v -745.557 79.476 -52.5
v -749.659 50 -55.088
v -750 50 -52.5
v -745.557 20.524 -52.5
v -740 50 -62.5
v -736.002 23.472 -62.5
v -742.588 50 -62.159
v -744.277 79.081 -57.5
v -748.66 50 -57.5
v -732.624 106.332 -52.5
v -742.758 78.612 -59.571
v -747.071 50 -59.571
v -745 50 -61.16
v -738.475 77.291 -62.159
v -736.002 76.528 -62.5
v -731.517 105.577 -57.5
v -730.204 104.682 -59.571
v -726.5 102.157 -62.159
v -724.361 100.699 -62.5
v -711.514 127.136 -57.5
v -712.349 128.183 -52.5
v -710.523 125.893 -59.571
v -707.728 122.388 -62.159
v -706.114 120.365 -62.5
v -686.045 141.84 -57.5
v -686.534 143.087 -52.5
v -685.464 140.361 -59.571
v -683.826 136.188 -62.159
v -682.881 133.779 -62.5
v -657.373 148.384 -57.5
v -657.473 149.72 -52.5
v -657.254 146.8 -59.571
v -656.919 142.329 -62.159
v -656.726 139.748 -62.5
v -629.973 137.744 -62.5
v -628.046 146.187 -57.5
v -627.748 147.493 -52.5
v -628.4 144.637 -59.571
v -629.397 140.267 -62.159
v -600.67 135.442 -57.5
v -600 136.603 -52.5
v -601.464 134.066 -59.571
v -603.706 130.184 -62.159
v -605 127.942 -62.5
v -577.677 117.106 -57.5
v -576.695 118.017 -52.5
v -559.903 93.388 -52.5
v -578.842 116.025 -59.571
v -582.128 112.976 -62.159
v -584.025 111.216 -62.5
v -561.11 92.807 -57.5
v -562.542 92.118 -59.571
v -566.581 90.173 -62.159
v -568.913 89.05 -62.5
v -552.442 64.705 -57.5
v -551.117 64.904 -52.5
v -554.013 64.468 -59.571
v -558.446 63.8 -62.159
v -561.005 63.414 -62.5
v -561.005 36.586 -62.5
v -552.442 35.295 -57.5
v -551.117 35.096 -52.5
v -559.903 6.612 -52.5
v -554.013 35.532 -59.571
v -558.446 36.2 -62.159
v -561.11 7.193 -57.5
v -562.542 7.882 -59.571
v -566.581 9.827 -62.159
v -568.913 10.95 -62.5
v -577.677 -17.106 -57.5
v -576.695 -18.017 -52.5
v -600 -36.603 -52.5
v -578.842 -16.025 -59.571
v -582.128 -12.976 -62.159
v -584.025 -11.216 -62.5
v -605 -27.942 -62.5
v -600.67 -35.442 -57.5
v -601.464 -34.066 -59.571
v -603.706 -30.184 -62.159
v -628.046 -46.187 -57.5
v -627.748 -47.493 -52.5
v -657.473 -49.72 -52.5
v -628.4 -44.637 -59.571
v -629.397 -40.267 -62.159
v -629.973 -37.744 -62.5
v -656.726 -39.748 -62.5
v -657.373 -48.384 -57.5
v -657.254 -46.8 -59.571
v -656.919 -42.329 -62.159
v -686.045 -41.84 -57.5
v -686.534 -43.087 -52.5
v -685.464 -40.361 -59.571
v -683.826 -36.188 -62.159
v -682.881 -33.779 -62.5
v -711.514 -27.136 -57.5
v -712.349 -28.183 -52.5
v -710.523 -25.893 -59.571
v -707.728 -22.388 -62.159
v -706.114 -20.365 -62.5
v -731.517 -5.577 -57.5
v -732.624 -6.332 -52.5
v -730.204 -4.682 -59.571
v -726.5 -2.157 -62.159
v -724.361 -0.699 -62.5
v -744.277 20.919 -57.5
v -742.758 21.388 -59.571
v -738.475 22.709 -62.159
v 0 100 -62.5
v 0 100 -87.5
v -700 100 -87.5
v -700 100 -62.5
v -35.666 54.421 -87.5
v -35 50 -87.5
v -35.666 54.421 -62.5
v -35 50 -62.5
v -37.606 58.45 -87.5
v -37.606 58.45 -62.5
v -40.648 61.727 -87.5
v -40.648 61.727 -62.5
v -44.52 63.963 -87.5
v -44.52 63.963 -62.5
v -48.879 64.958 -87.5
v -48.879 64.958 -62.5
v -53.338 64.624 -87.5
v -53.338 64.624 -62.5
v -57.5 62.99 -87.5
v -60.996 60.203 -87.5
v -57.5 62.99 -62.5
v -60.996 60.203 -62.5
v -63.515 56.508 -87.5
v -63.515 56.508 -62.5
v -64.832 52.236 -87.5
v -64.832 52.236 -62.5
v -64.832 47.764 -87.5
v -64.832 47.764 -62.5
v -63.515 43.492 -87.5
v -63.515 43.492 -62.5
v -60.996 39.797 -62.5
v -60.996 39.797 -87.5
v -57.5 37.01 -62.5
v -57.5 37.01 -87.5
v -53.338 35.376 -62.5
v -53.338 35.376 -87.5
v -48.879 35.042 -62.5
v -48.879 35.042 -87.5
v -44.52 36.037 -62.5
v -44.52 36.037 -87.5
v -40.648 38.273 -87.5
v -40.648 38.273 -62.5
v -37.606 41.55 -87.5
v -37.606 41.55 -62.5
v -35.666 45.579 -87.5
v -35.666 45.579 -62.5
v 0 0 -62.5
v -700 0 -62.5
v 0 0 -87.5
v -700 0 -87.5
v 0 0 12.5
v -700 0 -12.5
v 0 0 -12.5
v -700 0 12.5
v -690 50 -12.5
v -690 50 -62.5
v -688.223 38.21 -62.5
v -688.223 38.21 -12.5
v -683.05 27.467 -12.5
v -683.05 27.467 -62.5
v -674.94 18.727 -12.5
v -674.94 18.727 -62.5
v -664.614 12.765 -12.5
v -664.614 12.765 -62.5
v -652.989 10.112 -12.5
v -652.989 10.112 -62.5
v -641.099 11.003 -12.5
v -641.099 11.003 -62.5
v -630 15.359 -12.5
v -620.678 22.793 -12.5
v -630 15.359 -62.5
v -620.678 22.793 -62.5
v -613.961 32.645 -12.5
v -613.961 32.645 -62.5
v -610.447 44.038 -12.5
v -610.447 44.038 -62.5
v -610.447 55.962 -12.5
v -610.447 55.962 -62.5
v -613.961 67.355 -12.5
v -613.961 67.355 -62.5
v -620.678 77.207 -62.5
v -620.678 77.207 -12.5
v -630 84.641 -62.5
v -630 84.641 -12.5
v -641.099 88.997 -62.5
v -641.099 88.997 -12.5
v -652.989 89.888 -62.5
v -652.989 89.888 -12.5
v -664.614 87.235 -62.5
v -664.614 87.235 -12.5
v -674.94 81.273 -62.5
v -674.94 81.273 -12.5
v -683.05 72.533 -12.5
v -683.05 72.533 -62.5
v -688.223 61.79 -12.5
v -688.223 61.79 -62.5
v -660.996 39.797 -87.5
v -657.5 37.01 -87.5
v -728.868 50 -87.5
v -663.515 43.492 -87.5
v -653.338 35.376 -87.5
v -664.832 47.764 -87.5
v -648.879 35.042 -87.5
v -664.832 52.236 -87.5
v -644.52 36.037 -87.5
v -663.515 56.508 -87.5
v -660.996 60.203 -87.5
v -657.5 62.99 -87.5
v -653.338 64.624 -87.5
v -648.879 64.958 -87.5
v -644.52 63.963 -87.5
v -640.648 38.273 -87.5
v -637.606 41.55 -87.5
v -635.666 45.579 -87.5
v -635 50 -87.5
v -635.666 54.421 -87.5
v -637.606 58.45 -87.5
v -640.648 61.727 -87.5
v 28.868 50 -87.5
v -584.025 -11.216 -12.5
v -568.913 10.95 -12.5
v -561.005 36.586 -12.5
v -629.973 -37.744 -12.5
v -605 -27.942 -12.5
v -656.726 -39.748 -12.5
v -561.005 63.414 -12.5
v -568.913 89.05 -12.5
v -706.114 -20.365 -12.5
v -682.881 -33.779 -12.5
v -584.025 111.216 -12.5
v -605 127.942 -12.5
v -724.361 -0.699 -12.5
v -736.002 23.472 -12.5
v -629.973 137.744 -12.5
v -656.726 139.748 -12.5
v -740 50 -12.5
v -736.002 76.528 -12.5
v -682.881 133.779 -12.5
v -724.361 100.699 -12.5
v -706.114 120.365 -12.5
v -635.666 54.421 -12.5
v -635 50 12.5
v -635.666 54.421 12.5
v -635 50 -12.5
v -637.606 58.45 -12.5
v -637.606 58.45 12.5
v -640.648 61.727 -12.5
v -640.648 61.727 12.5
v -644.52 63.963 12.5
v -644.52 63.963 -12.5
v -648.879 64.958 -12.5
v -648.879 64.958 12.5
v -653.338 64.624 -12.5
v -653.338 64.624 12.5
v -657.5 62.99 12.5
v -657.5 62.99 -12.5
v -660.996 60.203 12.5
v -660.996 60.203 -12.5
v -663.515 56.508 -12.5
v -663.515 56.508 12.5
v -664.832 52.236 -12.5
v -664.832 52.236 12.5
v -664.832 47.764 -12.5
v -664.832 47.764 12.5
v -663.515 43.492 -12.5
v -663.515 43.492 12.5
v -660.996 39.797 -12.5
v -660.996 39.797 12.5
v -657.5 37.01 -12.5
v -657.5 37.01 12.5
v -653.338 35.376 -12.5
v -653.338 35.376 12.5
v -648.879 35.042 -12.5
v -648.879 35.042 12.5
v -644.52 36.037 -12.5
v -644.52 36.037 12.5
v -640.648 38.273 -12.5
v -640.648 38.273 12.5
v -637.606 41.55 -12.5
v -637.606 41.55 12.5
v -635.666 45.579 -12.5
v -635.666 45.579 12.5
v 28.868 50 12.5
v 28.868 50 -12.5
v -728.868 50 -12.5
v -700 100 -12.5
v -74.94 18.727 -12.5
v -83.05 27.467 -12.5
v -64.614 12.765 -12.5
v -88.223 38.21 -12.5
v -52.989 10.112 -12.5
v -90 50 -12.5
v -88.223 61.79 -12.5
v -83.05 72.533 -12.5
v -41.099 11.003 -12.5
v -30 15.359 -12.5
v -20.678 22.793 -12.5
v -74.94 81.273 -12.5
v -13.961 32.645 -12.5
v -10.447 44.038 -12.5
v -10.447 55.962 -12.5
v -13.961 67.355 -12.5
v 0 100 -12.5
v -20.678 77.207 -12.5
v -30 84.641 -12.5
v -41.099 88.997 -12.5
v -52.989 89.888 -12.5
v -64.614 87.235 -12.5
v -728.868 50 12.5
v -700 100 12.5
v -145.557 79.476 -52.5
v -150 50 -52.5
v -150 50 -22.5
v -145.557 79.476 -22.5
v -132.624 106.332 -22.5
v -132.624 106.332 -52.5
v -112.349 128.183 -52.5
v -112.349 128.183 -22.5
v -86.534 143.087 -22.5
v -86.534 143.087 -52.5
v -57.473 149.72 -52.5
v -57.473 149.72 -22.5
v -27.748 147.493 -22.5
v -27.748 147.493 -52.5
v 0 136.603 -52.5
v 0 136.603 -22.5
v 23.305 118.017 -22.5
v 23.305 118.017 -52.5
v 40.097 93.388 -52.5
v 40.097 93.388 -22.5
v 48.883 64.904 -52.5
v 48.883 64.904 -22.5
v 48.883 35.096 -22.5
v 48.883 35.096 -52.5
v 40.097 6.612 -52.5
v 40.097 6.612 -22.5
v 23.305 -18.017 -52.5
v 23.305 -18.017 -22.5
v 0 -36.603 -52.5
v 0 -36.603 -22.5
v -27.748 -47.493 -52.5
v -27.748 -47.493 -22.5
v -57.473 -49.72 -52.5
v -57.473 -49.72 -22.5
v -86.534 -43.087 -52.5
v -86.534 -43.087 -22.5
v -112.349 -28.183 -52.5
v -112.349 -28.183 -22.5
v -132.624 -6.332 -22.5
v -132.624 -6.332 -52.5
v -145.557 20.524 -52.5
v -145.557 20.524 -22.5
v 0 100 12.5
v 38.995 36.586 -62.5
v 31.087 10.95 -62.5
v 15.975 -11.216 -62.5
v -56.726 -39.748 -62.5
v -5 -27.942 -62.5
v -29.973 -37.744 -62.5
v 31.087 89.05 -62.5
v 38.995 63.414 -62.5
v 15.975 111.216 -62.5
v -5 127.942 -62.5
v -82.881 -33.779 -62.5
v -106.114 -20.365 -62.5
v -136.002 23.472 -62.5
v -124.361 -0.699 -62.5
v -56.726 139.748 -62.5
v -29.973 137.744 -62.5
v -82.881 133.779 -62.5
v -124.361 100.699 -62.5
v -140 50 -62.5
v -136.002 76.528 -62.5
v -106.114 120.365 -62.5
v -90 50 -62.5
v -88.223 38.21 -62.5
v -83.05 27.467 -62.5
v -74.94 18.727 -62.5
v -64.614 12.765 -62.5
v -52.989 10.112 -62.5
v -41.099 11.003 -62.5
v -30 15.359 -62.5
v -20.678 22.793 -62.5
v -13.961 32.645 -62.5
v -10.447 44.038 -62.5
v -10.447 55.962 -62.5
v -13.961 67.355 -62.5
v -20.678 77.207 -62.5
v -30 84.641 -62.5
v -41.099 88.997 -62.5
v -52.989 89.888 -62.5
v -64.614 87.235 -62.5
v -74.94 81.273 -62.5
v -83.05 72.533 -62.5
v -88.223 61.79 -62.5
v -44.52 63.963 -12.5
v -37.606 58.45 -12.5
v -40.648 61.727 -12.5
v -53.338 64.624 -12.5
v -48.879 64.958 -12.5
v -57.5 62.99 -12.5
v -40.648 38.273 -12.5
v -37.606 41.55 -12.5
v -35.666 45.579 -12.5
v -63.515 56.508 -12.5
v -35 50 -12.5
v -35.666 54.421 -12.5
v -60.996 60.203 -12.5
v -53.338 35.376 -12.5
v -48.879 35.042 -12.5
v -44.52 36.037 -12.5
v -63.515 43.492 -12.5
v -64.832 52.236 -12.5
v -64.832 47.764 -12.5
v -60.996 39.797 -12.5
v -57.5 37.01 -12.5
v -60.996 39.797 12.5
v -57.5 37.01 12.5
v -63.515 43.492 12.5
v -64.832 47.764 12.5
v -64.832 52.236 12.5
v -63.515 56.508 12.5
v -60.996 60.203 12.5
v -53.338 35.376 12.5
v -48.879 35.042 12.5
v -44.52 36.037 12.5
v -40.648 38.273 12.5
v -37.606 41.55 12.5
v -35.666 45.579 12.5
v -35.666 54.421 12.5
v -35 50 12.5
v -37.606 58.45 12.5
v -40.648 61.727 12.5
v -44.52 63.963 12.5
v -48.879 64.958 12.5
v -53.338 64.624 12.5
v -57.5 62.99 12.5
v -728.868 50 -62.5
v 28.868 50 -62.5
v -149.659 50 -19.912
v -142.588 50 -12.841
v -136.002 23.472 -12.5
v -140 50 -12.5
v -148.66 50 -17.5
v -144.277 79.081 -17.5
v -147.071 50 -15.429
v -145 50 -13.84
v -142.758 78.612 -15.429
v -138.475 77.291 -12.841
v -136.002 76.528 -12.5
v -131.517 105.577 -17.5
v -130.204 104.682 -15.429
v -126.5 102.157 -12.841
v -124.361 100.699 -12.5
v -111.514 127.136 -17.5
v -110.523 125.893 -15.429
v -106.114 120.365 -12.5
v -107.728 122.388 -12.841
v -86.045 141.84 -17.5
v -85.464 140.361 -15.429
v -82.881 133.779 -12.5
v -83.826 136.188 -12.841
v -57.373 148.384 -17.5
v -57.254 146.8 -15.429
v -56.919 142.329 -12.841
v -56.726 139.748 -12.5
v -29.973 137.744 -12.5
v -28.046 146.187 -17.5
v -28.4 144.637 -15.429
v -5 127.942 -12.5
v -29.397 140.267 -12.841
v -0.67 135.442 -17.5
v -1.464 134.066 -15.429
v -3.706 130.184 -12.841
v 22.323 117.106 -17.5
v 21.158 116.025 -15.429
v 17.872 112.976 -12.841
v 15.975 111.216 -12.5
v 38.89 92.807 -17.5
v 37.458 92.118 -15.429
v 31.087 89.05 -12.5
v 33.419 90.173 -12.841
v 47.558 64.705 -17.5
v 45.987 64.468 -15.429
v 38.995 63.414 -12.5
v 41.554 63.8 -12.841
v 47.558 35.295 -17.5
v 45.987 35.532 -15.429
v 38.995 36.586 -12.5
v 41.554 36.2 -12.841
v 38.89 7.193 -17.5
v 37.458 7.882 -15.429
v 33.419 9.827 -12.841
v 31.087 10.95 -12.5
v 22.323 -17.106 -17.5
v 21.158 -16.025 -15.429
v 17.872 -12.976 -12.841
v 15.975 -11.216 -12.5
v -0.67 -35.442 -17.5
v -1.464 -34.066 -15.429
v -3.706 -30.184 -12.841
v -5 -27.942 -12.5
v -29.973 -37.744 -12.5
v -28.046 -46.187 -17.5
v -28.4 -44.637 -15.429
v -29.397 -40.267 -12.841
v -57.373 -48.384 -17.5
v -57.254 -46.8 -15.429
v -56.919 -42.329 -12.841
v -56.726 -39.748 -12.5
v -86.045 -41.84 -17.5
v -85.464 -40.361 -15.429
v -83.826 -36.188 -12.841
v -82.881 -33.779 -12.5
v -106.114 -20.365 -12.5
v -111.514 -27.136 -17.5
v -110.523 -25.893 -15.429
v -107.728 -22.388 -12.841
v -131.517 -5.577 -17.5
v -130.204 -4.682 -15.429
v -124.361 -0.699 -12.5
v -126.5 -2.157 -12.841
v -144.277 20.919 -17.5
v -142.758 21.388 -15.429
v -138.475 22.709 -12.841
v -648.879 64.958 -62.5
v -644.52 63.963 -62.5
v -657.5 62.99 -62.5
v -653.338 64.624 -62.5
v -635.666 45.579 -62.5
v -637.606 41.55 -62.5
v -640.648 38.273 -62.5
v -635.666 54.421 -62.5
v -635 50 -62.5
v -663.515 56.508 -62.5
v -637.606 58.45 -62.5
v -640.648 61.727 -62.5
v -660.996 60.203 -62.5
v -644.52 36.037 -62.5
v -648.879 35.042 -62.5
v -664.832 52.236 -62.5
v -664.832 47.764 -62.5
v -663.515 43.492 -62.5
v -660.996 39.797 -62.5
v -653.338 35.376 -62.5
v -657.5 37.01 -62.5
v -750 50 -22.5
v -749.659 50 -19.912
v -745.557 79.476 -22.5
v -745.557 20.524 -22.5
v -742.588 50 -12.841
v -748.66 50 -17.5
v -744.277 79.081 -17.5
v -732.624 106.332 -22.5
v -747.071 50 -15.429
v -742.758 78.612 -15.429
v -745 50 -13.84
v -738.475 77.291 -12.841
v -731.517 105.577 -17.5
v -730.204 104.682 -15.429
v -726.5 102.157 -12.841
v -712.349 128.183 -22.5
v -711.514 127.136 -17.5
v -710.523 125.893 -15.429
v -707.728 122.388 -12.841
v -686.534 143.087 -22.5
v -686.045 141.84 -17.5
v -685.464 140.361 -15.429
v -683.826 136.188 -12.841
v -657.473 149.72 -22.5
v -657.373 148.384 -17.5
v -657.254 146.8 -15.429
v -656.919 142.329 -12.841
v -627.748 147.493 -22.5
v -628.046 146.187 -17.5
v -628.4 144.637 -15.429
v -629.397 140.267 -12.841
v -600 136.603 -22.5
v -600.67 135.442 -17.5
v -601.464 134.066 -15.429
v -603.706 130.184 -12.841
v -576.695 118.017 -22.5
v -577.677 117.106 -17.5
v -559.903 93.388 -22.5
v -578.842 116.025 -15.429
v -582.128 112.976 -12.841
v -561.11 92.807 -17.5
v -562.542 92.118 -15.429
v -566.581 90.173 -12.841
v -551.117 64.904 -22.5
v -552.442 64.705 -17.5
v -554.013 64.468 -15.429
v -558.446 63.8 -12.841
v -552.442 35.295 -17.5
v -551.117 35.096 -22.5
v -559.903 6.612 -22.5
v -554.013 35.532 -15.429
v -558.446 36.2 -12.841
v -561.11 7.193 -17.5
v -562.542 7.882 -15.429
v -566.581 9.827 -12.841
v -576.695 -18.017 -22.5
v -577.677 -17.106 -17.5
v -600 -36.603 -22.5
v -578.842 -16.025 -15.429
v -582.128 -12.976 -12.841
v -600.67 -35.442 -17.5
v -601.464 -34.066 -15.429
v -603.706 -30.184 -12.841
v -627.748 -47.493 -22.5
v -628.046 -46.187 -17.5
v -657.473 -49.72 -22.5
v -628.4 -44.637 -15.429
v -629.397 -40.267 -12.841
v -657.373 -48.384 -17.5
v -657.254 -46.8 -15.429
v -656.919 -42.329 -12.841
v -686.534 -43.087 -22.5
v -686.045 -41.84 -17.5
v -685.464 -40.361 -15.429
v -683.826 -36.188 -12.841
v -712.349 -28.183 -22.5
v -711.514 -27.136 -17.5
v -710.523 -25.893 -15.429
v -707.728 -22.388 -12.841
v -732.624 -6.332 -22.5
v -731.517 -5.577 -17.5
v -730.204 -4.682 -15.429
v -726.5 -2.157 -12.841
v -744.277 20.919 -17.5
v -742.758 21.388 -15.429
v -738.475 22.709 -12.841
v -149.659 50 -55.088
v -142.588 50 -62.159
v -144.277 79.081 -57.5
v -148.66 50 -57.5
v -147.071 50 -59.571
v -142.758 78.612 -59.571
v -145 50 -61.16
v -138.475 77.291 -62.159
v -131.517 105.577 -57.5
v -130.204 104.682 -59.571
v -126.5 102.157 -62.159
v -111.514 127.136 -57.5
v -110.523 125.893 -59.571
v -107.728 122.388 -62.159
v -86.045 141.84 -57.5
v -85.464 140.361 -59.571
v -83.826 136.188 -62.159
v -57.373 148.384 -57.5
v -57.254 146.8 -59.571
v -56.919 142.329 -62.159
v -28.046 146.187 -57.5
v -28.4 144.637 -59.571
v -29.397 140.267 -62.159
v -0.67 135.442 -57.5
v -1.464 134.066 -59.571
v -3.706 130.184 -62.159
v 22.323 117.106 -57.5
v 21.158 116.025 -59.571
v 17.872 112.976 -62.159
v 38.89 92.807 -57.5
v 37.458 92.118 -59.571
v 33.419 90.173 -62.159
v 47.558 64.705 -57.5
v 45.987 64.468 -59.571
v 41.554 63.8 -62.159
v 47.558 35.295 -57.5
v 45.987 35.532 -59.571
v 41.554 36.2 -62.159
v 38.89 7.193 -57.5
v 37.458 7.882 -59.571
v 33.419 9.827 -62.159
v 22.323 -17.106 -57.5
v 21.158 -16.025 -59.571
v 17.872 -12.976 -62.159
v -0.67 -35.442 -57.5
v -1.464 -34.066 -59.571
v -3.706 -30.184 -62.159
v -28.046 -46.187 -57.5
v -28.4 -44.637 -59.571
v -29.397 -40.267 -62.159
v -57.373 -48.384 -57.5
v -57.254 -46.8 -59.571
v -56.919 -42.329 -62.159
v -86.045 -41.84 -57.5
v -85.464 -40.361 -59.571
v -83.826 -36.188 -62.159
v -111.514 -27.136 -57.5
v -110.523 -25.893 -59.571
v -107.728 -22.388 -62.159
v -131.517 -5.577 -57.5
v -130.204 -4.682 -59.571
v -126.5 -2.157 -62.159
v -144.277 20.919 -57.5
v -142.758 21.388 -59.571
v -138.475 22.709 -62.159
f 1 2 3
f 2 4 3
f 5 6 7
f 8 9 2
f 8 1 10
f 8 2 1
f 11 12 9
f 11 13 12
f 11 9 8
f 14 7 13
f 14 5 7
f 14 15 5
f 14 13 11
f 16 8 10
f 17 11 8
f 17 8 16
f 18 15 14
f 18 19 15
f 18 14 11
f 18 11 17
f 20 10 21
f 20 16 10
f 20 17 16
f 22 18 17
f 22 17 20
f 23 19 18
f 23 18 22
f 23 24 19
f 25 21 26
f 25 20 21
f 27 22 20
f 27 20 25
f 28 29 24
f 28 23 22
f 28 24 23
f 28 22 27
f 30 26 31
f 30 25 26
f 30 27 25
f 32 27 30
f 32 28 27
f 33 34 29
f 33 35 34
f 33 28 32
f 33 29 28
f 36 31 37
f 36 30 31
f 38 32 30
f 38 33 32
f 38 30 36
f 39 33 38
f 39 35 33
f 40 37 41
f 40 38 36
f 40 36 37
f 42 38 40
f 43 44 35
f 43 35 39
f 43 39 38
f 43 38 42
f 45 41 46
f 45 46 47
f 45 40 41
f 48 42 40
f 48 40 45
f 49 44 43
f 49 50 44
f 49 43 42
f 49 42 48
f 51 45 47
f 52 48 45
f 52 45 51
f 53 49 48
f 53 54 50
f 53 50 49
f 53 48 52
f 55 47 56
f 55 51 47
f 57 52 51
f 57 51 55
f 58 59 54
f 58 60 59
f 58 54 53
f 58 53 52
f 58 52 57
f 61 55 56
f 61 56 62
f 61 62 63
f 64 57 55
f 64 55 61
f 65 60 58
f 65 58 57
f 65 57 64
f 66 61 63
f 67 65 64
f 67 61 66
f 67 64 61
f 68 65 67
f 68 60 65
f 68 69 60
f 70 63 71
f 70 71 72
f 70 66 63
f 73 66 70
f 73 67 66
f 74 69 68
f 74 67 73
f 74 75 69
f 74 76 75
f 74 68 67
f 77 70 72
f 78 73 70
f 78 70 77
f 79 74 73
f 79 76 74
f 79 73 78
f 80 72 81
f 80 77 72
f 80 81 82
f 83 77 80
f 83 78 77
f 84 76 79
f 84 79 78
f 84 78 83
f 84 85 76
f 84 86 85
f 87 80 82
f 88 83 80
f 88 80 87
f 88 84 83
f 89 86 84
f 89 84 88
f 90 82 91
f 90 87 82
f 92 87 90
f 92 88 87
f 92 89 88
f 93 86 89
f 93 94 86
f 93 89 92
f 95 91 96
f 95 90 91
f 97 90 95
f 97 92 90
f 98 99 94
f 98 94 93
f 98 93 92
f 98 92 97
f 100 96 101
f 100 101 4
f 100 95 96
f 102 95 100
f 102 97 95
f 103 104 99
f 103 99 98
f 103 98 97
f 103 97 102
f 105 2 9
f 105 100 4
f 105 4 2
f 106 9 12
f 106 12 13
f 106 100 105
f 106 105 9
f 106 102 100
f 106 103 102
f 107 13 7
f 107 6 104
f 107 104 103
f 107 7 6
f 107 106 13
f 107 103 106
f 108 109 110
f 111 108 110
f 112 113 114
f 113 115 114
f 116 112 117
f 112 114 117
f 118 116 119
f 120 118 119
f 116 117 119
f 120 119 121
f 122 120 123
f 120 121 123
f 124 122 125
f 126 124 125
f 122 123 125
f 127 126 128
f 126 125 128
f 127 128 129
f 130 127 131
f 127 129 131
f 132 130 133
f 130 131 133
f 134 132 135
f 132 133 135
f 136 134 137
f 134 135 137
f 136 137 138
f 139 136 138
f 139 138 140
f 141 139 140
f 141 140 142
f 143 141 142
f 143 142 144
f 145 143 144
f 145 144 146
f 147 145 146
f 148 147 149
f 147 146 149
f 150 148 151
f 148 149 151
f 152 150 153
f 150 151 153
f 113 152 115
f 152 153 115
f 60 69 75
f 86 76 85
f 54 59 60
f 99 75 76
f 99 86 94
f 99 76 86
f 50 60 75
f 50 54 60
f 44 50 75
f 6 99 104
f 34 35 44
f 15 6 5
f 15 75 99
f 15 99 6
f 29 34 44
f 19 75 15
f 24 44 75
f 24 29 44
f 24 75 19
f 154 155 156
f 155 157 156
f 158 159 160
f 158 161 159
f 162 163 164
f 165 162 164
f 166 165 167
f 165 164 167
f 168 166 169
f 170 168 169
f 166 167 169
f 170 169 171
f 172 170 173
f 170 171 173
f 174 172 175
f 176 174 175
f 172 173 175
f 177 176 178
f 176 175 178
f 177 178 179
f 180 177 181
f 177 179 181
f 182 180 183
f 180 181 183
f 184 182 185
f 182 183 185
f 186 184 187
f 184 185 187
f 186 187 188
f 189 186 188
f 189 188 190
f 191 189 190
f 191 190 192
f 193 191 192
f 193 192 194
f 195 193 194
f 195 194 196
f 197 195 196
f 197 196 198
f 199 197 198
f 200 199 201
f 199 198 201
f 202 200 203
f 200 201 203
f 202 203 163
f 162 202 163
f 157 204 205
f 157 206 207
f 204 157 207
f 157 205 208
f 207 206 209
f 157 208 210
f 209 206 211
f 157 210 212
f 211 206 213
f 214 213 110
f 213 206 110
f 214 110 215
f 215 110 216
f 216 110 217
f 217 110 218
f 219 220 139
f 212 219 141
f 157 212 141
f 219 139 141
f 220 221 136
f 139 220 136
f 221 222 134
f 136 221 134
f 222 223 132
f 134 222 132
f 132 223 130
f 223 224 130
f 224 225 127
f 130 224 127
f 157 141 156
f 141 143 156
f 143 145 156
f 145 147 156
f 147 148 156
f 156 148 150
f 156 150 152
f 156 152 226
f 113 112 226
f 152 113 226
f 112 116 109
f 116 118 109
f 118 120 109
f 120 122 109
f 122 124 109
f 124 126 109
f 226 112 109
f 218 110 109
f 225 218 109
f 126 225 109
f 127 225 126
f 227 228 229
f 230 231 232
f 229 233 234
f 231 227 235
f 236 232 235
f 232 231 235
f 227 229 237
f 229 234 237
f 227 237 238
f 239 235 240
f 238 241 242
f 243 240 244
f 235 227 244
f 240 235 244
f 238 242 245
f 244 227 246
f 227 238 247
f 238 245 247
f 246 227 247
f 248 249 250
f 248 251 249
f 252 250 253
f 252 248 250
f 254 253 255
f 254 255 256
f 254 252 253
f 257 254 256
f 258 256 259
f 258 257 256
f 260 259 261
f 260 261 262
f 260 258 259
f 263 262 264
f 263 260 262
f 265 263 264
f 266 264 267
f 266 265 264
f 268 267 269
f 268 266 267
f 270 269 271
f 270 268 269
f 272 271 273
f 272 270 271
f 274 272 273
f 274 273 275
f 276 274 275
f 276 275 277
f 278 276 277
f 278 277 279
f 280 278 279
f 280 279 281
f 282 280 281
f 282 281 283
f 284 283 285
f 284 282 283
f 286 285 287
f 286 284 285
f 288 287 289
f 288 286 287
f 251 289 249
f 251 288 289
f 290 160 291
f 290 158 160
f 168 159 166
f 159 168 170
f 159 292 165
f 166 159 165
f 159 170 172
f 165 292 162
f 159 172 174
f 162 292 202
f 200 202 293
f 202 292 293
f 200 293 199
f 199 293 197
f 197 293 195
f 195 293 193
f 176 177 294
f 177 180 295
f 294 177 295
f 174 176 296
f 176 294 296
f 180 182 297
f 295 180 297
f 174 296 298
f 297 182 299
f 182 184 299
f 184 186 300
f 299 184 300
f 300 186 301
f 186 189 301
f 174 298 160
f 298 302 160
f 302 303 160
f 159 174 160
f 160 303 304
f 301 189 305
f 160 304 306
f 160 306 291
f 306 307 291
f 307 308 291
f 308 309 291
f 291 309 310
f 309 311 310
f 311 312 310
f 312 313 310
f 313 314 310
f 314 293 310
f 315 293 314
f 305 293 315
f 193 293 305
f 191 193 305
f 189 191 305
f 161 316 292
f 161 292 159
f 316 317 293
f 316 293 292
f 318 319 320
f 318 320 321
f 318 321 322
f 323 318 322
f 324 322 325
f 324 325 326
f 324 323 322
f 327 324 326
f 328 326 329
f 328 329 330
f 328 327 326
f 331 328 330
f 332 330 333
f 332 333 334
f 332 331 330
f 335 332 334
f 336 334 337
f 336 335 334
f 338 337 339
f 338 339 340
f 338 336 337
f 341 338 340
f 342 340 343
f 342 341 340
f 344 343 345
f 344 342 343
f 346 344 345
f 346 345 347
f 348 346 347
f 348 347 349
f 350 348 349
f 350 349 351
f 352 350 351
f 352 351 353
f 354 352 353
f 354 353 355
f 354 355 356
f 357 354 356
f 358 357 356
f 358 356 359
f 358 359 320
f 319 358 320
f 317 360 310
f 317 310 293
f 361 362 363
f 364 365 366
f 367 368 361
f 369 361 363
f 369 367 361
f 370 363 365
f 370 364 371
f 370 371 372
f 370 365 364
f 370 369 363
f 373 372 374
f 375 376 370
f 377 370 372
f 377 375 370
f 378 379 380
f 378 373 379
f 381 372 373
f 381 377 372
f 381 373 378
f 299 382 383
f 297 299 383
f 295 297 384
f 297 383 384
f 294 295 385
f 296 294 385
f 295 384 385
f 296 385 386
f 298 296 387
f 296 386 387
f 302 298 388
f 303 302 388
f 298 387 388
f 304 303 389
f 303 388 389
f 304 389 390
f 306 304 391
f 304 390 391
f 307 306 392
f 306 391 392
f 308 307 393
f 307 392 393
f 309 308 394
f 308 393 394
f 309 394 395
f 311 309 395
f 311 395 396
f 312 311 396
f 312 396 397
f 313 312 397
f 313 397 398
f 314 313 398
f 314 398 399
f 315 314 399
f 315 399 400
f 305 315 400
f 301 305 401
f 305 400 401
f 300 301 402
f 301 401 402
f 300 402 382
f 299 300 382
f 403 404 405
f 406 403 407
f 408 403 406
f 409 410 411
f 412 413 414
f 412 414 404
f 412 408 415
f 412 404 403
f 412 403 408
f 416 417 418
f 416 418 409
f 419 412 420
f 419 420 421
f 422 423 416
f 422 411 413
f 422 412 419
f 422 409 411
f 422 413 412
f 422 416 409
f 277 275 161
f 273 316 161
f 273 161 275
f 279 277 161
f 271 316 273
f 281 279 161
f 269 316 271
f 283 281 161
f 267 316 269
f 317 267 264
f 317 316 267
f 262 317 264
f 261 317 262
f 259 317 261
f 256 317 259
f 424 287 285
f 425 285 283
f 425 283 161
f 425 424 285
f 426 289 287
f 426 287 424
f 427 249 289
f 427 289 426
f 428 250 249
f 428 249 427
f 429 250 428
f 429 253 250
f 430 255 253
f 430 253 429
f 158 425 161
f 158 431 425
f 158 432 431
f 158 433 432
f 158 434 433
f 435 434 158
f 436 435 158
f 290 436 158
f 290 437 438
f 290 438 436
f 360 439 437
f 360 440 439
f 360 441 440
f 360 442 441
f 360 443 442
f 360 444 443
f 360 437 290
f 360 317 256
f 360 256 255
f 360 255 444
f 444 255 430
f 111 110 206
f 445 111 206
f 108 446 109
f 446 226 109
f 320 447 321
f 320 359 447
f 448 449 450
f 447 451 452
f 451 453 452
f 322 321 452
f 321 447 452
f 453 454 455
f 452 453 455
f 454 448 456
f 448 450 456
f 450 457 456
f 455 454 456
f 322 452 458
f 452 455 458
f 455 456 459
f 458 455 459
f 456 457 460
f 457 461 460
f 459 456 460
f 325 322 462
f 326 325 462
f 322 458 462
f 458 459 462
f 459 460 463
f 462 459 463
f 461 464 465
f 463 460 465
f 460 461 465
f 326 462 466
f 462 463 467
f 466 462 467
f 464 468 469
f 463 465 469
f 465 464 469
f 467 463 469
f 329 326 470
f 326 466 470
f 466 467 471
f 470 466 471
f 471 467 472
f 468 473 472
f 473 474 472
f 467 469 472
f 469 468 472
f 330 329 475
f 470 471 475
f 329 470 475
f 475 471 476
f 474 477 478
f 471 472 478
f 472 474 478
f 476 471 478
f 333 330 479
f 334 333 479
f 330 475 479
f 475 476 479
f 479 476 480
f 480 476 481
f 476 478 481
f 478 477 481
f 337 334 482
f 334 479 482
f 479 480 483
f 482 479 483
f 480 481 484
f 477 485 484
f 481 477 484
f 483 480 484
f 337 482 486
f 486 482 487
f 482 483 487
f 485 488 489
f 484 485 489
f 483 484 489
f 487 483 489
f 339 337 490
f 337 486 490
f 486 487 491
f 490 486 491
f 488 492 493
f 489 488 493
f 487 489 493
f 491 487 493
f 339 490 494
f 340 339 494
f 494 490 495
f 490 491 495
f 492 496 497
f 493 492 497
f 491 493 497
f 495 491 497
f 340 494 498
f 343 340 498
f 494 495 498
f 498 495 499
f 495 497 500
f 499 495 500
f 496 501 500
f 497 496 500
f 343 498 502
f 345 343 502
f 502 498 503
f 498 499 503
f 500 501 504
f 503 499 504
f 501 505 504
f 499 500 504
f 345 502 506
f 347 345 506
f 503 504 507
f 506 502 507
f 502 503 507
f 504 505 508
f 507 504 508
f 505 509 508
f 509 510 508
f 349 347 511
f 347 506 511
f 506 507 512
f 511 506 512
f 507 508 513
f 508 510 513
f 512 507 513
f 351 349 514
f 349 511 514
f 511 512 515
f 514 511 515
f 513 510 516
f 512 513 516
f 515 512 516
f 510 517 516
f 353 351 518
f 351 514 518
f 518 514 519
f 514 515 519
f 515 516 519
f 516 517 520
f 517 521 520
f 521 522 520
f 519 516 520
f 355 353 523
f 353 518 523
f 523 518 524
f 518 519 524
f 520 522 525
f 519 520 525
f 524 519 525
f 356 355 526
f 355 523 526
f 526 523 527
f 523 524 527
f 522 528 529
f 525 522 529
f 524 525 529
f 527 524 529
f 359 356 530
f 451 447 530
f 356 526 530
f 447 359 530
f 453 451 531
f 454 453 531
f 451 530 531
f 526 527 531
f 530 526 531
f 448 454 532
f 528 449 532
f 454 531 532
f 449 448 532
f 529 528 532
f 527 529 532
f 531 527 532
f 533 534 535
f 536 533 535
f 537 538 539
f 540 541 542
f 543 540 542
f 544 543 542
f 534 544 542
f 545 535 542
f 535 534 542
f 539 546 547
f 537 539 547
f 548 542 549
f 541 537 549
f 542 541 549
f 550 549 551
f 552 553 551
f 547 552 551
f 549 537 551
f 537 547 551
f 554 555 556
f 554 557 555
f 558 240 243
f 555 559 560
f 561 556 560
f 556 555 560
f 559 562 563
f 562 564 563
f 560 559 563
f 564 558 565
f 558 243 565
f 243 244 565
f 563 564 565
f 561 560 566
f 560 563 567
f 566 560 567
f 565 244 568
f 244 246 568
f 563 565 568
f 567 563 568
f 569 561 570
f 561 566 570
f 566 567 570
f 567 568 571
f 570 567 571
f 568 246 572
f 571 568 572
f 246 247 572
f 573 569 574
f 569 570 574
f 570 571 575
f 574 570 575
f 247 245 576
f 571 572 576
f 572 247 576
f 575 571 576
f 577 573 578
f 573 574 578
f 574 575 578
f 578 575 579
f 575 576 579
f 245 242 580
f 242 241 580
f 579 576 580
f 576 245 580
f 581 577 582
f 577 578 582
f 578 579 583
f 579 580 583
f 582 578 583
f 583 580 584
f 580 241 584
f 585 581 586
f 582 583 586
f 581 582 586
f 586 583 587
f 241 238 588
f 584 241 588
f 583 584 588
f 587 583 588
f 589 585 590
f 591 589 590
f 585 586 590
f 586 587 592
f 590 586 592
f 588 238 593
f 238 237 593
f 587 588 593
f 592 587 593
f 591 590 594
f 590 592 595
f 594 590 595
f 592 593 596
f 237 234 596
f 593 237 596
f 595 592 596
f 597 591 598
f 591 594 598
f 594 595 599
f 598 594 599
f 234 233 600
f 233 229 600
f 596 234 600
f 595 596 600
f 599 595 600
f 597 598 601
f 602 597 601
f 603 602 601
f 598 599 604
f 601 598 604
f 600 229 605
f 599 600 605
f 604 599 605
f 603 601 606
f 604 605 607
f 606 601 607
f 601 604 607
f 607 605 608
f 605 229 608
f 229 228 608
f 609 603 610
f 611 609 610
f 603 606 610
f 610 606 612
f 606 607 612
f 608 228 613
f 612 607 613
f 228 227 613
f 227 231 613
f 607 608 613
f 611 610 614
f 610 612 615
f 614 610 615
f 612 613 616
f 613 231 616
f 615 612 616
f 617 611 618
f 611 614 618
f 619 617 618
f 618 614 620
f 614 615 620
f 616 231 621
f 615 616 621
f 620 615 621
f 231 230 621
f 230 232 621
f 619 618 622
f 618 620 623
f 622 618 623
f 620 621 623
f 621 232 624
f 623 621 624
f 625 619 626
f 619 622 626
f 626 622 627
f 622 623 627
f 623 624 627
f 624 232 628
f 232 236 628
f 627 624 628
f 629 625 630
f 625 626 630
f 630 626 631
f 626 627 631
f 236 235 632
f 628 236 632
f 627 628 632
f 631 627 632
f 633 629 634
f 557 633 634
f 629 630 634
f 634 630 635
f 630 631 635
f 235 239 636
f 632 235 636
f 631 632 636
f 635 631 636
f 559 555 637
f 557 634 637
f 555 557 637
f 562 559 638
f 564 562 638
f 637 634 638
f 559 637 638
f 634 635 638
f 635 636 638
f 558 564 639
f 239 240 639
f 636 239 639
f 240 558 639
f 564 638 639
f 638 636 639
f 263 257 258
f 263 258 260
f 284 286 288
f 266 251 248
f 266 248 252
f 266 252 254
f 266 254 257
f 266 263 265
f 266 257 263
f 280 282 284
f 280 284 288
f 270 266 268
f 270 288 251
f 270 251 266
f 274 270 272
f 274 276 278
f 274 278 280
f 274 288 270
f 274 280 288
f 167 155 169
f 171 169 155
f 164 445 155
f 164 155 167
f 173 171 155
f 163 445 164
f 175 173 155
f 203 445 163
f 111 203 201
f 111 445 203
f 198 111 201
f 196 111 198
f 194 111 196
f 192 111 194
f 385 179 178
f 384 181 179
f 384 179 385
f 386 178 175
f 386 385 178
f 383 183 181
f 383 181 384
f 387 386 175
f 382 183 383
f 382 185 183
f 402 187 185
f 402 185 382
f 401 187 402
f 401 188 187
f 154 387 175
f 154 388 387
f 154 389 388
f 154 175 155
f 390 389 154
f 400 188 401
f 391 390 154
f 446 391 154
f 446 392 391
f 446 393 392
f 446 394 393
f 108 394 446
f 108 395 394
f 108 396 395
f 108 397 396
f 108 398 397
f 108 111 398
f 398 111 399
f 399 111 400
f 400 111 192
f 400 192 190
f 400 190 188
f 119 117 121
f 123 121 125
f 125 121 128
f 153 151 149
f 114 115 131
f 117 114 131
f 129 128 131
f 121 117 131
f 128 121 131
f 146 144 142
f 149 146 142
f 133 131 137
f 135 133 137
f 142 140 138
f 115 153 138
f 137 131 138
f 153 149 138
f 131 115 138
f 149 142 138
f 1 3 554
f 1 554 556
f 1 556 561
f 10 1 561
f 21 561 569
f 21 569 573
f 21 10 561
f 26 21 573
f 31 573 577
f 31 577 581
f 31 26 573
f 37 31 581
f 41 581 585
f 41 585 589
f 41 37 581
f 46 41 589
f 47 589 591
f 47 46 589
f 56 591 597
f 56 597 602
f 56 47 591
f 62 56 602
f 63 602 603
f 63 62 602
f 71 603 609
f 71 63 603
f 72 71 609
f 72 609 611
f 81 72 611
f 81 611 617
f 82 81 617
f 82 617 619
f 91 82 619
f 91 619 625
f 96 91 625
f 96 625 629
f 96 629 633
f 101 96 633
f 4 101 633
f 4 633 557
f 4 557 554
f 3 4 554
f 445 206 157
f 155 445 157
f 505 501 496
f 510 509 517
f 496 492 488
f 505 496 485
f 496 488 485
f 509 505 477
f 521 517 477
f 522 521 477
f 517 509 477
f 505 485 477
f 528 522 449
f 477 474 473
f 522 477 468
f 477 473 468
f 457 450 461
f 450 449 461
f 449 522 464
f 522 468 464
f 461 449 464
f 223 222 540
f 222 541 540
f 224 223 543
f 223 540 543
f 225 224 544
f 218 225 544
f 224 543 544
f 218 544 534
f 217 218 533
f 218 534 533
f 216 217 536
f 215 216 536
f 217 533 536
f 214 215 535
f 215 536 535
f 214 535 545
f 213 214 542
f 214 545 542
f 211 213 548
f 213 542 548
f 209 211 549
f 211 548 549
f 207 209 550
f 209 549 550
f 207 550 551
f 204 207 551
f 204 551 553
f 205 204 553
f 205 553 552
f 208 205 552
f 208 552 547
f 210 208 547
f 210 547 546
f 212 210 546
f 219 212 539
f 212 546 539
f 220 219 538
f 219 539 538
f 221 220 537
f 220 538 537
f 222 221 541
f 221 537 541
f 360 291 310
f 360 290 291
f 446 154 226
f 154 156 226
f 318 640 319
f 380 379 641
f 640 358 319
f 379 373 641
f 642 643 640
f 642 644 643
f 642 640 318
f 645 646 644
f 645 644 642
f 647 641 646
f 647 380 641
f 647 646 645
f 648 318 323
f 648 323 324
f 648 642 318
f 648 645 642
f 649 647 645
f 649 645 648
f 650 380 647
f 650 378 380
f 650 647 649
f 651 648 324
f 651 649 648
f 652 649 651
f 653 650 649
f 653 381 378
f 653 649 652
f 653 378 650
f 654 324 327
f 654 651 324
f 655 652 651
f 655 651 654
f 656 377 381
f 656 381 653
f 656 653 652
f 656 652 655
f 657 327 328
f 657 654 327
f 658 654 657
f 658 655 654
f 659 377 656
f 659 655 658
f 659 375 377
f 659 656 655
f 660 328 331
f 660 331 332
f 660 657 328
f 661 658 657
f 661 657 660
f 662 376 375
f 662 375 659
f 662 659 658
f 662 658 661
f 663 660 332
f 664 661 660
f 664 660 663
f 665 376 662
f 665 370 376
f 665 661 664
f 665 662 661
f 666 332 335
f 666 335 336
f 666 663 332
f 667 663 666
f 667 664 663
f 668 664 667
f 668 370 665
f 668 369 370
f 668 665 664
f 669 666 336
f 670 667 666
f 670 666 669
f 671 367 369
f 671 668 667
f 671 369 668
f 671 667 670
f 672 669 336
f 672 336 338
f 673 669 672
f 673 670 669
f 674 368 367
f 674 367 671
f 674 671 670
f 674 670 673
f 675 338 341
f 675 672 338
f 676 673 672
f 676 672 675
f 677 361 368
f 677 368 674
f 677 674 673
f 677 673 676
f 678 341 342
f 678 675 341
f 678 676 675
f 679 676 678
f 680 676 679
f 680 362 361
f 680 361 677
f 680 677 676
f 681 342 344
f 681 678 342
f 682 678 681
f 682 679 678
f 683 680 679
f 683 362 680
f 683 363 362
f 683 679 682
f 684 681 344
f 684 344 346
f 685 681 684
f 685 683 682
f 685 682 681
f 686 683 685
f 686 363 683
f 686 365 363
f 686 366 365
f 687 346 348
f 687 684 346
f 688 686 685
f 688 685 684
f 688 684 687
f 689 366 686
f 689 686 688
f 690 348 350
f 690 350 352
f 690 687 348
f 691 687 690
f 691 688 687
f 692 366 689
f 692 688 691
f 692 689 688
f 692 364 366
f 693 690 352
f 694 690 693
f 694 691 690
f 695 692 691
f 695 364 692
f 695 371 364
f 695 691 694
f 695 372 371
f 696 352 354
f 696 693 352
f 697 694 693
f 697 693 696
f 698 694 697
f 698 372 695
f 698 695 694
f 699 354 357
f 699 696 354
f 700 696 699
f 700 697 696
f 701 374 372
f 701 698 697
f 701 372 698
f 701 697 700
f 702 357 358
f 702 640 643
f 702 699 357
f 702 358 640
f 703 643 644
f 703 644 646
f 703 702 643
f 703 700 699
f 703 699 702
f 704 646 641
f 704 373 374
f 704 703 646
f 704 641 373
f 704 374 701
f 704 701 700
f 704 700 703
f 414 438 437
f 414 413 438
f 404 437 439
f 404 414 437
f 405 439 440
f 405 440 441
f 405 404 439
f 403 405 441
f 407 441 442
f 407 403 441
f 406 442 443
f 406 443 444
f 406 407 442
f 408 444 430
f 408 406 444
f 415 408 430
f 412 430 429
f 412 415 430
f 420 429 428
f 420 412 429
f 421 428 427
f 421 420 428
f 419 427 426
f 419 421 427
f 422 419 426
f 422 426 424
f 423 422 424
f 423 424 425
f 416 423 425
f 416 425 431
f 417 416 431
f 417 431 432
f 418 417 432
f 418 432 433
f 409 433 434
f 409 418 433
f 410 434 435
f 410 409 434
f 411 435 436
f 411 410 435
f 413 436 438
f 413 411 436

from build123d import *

# Parameters (mm, degrees)
SKETCH1_R             = 15
BOSS_EXTRUDE1_DEPTH   = 12.5
SKETCH2_R             = 40
BOSS_EXTRUDE2_DEPTH   = 50
SKETCH3_R             = 100
BOSS_EXTRUDE3_DEPTH   = 25
BOSS_EXTRUDE3_2_DEPTH = 25
FILLET1_R             = 10
FILLET2_R             = 10


with BuildPart() as part:
    # Sketch1 → Boss-Extrude1 (new, symmetric)
    with BuildSketch(Plane.XY):
        Polygon((28.867513459, 50), (0, 100), (-700, 100), (-728.867513459, 50), (-700, 0), (0, 0), align=None)
        with Locations((-650, 50)):
            Circle(SKETCH1_R, mode=Mode.SUBTRACT)
        with Locations((-50, 50)):
            Circle(SKETCH1_R, mode=Mode.SUBTRACT)
    extrude(amount=BOSS_EXTRUDE1_DEPTH, both=True)


with BuildPart() as body_2:
    # Mirror6: mirrored copy
    add(part.part.mirror(Plane(origin=(0, 0, -37.5), x_dir=(1, 0, 0), z_dir=(0, 0, -1))))


with BuildPart() as part_1:
    add(part.part)

    add(body_2.part)  # Boss-Extrude2 merges body 2
    # Sketch2 → Boss-Extrude2 (add)
    with BuildSketch(Plane.XY.offset(-62.5)):
        with Locations(Location((-650, 50, 0), (0, 0, 180))):
            Circle(SKETCH2_R)
        with Locations(Location((-50, 50, 0), (0, 0, 180))):
            Circle(SKETCH2_R)
    extrude(amount=BOSS_EXTRUDE2_DEPTH)


with BuildPart() as body_2_2:
    # Sketch3 → Boss-Extrude3 (new, symmetric)
    with BuildSketch(Plane(origin=(0, 0, -37.5), x_dir=(-1, 0, 0), z_dir=(0, 0, -1))):
        with Locations((50, 50)):
            Circle(SKETCH3_R)
    extrude(amount=BOSS_EXTRUDE3_DEPTH, both=True)

    # Fillet1
    fillet1_edges = [body_2_2.edges().sort_by_distance(p)[0] for p in [
        (50, 50, -12.5),
        (50, 50, -62.5),
    ]]
    fillet(fillet1_edges, radius=FILLET1_R)


with BuildPart() as body_3:
    # Sketch3 → Boss-Extrude3 2 (new, symmetric)
    with BuildSketch(Plane(origin=(0, 0, -37.5), x_dir=(-1, 0, 0), z_dir=(0, 0, -1))):
        with Locations((650, 50)):
            Circle(SKETCH3_R)
    extrude(amount=BOSS_EXTRUDE3_2_DEPTH, both=True)

    # Fillet2
    fillet2_edges = [body_3.edges().sort_by_distance(p)[0] for p in [
        (-550, 50, -12.5),
        (-550, 50, -62.5),
    ]]
    fillet(fillet2_edges, radius=FILLET2_R)


solid = Compound([part_1.part, body_2_2.part, body_3.part])
